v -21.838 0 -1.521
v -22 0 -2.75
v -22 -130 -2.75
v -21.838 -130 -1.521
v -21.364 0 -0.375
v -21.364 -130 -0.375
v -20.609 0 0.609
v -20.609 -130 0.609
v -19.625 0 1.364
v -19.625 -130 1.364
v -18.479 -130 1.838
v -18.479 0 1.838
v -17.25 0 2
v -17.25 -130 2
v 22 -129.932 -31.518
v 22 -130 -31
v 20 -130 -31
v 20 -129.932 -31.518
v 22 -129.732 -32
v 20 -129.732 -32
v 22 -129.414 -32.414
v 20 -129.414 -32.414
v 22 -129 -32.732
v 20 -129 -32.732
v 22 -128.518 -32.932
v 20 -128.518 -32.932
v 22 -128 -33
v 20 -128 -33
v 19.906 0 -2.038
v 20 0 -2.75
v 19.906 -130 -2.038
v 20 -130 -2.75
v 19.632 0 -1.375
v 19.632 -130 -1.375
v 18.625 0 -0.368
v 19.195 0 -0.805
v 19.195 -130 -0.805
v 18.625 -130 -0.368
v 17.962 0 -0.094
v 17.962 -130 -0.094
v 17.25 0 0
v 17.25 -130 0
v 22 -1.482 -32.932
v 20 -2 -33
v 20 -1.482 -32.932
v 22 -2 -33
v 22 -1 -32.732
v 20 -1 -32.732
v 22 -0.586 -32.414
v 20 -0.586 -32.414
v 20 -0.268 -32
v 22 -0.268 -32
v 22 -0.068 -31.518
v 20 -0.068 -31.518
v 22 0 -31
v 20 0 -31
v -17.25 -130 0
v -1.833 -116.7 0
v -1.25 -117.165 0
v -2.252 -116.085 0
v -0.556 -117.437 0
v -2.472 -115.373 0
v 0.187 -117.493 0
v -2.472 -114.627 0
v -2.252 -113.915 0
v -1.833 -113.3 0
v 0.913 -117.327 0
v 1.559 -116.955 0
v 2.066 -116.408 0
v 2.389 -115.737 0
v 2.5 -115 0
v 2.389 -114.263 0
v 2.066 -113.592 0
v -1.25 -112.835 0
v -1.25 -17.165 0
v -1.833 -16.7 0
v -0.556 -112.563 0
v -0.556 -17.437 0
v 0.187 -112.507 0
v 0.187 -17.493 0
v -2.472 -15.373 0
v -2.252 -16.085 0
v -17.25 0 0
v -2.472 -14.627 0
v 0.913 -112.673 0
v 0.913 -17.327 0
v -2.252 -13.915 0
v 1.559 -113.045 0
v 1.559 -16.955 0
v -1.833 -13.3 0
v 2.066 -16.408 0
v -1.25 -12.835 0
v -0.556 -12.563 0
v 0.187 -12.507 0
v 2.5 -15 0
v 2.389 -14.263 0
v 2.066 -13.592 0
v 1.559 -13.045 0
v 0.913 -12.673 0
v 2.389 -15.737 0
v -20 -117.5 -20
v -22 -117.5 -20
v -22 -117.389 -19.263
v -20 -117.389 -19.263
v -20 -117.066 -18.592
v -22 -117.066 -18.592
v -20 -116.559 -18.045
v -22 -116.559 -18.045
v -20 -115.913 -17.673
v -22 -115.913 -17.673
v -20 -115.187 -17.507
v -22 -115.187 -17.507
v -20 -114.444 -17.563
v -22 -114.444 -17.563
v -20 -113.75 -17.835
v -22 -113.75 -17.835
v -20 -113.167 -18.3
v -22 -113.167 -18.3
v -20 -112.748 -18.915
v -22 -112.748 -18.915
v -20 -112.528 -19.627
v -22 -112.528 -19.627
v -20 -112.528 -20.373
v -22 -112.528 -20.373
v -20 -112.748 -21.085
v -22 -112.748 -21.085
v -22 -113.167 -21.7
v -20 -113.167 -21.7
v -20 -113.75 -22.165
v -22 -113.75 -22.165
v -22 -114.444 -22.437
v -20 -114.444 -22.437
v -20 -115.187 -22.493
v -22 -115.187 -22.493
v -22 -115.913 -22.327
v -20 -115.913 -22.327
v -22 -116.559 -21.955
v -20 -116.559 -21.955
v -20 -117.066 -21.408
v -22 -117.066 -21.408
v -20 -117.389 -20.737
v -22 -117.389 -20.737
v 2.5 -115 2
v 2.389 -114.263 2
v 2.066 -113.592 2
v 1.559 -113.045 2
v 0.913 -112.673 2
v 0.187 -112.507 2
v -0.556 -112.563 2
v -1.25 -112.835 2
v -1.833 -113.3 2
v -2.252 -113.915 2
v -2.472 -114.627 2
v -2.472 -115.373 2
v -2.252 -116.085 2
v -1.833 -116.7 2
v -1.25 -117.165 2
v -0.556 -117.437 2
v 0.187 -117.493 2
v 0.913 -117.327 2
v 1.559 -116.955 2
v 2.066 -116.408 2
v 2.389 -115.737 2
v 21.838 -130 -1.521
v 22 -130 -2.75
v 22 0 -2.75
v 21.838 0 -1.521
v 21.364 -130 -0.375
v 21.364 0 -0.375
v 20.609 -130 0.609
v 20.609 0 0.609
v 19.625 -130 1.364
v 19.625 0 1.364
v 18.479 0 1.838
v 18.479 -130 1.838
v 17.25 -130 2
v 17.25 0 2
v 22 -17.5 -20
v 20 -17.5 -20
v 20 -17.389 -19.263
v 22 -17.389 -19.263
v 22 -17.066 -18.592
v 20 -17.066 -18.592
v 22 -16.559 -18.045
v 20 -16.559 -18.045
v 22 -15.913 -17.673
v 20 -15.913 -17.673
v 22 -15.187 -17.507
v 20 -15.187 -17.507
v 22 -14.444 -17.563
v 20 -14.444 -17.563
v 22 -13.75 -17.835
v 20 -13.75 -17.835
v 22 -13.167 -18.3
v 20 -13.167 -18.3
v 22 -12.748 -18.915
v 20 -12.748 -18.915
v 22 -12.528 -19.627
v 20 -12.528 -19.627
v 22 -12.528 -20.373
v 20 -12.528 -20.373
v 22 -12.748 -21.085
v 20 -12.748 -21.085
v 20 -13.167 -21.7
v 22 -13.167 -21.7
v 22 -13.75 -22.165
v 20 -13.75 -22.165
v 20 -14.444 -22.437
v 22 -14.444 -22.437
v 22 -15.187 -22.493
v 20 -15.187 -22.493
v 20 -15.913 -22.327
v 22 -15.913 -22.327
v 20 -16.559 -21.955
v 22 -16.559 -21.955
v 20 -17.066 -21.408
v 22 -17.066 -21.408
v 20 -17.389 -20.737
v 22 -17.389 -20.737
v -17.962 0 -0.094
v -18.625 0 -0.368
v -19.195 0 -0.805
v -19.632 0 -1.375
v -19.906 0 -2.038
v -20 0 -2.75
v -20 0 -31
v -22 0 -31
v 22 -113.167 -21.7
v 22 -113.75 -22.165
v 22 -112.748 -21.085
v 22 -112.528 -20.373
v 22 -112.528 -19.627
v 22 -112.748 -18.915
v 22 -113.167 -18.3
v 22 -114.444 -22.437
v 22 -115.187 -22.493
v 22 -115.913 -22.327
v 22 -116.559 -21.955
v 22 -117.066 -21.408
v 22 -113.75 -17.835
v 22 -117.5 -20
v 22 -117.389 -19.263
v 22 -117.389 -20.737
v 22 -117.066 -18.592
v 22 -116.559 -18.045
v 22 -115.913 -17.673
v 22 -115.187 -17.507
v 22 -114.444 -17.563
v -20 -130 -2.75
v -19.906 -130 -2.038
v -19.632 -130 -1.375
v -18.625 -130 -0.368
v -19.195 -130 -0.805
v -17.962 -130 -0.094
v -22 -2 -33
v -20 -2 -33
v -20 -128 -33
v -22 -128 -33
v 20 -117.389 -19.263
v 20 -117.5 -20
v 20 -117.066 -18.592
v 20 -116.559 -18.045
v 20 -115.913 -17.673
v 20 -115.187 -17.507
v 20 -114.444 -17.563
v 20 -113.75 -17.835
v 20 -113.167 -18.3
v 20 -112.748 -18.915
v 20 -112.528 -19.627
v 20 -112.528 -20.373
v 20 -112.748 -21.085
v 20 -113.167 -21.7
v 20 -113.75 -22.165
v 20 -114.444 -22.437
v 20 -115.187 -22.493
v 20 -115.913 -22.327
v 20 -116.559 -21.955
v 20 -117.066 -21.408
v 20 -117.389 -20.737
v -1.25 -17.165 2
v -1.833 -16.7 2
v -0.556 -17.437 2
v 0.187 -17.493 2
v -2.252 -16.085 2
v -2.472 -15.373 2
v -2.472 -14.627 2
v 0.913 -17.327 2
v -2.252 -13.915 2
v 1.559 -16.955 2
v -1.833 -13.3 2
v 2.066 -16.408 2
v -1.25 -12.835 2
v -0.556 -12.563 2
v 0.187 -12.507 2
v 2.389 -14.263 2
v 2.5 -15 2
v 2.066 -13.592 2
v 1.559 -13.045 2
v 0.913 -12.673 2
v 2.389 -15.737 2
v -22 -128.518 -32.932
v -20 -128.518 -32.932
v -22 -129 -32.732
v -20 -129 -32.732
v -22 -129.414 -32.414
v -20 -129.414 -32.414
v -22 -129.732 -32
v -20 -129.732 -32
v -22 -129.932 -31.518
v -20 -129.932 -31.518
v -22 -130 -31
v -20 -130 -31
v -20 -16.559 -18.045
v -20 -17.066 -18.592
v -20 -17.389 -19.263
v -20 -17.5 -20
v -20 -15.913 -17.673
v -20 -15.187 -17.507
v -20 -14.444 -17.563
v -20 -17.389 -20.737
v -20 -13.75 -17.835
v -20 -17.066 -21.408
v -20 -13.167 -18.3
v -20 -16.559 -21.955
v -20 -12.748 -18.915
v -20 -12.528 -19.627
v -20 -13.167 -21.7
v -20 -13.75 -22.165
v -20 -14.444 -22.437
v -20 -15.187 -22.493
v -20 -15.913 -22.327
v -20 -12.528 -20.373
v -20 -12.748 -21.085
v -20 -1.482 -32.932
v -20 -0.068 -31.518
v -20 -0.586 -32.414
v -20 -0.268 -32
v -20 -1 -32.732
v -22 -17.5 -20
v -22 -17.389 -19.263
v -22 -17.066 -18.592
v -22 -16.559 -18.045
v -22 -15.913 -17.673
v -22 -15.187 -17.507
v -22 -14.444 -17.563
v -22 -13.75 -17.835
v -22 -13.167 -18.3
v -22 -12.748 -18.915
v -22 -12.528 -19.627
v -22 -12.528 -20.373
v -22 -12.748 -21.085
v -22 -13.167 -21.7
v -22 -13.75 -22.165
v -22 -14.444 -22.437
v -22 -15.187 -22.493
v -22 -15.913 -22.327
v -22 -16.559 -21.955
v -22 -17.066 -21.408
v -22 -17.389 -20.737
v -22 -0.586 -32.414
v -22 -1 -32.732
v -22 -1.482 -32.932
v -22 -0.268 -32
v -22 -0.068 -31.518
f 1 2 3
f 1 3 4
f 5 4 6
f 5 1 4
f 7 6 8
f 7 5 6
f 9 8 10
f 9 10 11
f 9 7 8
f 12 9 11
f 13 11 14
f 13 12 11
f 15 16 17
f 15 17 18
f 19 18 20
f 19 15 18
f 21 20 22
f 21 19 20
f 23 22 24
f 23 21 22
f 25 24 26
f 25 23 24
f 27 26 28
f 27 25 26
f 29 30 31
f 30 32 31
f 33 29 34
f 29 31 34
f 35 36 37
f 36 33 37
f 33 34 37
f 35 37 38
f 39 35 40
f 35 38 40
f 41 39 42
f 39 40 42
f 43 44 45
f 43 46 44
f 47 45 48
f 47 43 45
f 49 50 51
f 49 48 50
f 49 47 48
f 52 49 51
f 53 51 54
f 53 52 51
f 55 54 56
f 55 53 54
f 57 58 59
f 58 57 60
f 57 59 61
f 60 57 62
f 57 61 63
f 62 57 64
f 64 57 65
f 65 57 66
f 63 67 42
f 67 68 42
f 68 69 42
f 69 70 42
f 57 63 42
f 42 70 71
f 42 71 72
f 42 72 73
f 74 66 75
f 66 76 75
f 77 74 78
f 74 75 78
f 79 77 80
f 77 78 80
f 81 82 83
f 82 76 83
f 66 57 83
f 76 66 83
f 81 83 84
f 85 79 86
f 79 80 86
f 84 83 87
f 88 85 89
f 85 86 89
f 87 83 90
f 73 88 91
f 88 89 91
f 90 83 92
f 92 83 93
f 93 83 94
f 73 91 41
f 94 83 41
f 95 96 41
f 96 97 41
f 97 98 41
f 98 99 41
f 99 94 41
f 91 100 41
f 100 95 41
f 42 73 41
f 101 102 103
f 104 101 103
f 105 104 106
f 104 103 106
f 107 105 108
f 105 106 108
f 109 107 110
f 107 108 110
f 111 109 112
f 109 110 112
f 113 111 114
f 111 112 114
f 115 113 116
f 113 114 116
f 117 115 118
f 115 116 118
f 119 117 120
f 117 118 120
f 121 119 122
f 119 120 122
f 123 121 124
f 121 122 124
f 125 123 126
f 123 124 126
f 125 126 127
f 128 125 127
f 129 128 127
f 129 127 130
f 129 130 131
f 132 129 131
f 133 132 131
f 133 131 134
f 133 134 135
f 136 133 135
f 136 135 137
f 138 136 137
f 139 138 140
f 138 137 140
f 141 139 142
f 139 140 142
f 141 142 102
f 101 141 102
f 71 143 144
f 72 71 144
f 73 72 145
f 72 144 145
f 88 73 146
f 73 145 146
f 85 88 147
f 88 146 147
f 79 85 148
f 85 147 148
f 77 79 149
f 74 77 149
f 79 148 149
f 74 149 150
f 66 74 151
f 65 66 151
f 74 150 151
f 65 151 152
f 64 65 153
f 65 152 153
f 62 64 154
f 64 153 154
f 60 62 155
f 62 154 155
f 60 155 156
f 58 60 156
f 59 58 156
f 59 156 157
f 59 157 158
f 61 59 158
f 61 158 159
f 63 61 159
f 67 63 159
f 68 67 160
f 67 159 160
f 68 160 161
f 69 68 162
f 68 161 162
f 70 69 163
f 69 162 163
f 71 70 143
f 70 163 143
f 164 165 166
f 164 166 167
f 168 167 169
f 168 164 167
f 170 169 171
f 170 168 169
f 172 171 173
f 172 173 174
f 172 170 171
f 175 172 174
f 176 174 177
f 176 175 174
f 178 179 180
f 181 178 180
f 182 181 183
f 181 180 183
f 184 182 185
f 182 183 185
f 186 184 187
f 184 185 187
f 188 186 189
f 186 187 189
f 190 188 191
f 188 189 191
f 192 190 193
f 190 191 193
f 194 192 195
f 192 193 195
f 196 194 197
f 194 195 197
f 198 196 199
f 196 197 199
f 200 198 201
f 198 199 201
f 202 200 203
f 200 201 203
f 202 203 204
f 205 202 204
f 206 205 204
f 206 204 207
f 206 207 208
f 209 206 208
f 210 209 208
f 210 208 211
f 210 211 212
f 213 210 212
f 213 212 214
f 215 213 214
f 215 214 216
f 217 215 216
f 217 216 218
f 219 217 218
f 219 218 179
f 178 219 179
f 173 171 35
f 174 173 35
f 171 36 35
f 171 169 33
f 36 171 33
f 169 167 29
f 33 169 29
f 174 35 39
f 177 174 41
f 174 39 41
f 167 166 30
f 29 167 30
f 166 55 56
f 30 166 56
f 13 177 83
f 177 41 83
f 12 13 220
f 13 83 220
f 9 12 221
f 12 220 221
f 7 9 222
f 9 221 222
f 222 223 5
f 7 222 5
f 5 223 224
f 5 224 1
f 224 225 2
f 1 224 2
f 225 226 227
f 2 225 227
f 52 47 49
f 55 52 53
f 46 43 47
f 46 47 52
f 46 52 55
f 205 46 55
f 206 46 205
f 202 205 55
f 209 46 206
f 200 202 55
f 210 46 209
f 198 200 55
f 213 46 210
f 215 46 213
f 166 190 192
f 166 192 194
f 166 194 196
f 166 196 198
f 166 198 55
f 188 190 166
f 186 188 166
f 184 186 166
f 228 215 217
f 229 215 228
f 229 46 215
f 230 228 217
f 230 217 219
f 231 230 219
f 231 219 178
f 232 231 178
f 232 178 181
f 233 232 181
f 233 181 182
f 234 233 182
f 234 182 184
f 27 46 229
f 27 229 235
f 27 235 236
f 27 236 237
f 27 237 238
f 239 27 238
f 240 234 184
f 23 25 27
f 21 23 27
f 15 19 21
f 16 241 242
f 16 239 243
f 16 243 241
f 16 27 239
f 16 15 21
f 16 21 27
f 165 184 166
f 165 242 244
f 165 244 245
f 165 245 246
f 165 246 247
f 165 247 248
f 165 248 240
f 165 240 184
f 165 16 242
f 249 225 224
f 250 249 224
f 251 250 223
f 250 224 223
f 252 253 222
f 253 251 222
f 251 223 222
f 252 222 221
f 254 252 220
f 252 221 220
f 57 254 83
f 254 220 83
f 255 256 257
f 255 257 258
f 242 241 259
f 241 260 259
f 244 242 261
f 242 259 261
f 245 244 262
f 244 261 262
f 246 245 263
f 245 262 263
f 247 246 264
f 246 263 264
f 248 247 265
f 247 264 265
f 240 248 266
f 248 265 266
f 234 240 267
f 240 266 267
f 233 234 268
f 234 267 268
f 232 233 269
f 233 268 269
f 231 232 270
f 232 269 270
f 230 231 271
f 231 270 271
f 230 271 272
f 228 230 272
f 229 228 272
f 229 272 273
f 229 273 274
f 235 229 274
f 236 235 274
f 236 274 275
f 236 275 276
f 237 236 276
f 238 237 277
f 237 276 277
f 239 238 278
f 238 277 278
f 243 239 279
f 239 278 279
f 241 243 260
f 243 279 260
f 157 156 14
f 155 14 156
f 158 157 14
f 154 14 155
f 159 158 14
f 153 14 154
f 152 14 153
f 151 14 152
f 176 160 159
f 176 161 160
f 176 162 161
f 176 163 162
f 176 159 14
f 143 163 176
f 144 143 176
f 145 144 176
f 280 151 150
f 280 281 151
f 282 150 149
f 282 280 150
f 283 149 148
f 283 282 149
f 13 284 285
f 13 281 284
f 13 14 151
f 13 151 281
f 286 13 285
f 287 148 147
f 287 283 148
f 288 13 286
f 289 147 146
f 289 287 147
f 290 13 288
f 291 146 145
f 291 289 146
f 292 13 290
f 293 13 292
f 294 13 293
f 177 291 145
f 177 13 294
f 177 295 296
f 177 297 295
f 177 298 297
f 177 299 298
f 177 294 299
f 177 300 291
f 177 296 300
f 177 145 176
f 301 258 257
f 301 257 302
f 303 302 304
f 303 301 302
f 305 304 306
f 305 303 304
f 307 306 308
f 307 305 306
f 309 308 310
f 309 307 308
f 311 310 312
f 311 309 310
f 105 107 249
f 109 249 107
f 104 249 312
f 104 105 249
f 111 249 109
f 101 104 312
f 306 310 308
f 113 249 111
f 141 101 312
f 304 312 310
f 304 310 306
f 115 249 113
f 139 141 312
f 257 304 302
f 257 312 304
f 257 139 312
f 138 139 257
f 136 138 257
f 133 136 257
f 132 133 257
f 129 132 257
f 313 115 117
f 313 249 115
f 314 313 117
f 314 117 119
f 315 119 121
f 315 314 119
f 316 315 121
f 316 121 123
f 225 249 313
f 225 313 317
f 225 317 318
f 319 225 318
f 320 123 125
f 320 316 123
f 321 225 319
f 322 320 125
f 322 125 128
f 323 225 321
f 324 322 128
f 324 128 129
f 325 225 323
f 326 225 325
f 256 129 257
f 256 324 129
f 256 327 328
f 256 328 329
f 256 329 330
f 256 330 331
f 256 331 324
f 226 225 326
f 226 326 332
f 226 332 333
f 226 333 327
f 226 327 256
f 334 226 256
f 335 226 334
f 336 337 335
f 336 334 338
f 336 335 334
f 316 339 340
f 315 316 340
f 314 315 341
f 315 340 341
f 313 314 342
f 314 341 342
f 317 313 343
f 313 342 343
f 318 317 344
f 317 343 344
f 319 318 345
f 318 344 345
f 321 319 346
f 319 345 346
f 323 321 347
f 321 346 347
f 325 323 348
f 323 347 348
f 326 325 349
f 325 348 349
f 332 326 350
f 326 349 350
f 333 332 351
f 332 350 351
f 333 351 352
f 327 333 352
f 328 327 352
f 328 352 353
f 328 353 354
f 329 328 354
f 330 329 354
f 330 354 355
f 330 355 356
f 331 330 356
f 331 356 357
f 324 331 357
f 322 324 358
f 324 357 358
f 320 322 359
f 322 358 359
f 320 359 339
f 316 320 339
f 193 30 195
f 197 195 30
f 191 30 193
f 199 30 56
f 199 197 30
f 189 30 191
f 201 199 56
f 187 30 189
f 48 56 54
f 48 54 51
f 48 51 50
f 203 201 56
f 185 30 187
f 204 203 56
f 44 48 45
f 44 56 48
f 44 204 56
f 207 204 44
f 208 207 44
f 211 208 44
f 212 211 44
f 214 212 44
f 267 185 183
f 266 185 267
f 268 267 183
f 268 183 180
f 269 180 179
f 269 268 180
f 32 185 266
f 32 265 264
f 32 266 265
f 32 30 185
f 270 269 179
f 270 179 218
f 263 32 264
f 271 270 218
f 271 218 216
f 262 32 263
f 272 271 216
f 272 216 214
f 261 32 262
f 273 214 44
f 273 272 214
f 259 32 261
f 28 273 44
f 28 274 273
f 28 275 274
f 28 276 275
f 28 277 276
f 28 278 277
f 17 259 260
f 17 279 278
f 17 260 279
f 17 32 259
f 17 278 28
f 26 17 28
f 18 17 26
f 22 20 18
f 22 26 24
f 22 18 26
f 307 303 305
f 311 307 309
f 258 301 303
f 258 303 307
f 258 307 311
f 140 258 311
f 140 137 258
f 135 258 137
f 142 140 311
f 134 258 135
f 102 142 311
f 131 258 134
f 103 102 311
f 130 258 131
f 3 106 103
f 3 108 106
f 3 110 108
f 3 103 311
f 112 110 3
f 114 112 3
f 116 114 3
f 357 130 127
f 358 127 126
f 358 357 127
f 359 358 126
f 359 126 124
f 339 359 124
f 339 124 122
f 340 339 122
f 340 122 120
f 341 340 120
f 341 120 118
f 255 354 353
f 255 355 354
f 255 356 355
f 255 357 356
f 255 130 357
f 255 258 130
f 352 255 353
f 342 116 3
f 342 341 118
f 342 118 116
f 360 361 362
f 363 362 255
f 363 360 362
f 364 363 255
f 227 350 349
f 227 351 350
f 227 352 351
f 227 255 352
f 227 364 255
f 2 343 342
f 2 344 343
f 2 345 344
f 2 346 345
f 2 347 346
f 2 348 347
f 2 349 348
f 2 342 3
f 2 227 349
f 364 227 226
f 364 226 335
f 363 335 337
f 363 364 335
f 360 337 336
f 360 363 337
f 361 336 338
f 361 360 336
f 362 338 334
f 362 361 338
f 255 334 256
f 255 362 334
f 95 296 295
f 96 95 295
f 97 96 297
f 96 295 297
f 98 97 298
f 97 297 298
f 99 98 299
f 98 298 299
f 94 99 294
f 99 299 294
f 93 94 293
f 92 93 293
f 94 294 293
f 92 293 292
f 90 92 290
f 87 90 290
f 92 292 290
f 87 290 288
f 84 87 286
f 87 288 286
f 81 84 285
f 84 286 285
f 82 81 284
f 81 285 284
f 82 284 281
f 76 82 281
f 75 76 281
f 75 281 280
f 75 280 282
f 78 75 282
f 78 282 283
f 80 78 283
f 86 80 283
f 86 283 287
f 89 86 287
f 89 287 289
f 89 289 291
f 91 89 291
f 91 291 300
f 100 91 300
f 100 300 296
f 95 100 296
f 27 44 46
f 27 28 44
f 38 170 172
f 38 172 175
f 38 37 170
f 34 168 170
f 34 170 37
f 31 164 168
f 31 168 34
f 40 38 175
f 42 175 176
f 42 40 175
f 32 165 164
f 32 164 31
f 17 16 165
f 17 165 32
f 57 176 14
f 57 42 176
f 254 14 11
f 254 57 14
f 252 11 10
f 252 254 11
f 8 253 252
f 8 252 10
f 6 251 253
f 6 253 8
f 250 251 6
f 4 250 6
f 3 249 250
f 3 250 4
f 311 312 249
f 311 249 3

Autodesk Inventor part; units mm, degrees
ref_plane "YZ Plane" through (0, 0, 0) normal (1, 0, 0) x (0, 1, 0)
ref_plane "XZ Plane" through (0, 0, 0) normal (0, 1, 0) x (-1, 0, 0)
ref_plane "XY Plane" through (0, 0, 0) normal (0, 0, 1) x (1, 0, 0)
sketch "Sketch1" plane through (0, 0, 0) normal (0, 0, 1) x (1, 0, 0)
  line L0 (-20, 0) -> (20, 0)
  line L1 (20, 0) -> (20, -130)
  line L2 (20, -130) -> (-20, -130)
  line L3 (-20, -130) -> (-20, 0)
  point P0 (0, 0)
  point P1 (0, 0)
  dimension "d0" = 40
  dimension "d1" = 130
extrude "Plate1" add sketch "Sketch1" along normal blind 2
sketch "Sketch2" plane through (20, -130, 0) normal (1, 0, 0) x (0, 1, 0)
  line L0 (130, 0) -> (0, 0)
  line L1 (0, 0) -> (0, -33)
  line L2 (0, -33) -> (130, -33)
  line L3 (130, -33) -> (130, 0)
edge flange "Flange1" height 35 angle 90 thickness 2 bend radius 2.75 thickness toward (1, 0, 0) relief round relief width 2 relief depth 1 corner gap 2.75 corner form 0 edges at (20, -65, 0) (-20, -65, 0) wall of the first edge with corners at (20, 0, 0) (20, -130, 0) (20, -130, -33) (20, 0, -33)
bend "Bend1"
corner "Corner1"
sketch "Sketch3" plane through (0, 0, 0) normal (1, 0, 0) x (0, 1, 0)
  line L0 (0, -33) -> (-130, -33) projected
  line L1 (-115, -20) -> (-115, -20) construction
  line L2 (-117.5, -20) -> (-117.5, -20)
  line L3 (-112.5, -20) -> (-112.5, -20)
  arc A0 (-112.5, -20) -> (-117.5, -20) centre (-115, -20) ccw
  arc A1 (-117.5, -20) -> (-112.5, -20) centre (-115, -20) ccw
  line L4 (-130, -2.75) -> (-130, -33) projected
  point P0 (0, 0)
  point P1 (-115, -20)
  dimension "d14" = 0
  dimension "d15" = 13
  dimension "d17" = 2.5
  dimension "d18" = 15
extrude "Extrusion1" cut sketch "Sketch3" along normal through all both and the other way through all
sketch "Sketch6" plane through (0, 0, 2) normal (0, 0, 1) x (1, 0, 0)
  line L0 (-17.25, 0) -> (17.25, 0) projected
  circle A0 centre (0, -115) radius 2.5
  line L1 (22, -112.5) -> (22, -117.5) projected
  point P0 (0, 0)
  point P1 (0, 0)
  point P2 (22, -115)
  dimension "d27" = 5
extrude "Extrusion3" cut sketch "Sketch6" against normal blind 10
fillet "Fillet1" radius 2 4 edges at (21, 0, -33) (-21, 0, -33) (21, -130, -33) (-21, -130, -33)
pattern_linear "Rectangular Pattern2" count 2 spacing 100 along (0, 1, 0) of "Extrusion1", "Extrusion3"
equation "\"d2\" = Thickness"
equation "\"d3\" = BendReliefWidth"
equation "\"d4\" = BendReliefDepth"
equation "\"d5\" = MinimumRemnant"
equation "\"d6\" = TransitionRadius"
equation "\"d9\" = BendRadius"
equation "\"d10\" = CornerReliefSize"
equation "\"d11\" = GapSize"
equation "\"d12\" = JacobiRadiusSize"
equation "\"BendReliefWidth\" = Thickness"
equation "\"BendReliefDepth\" = 0.5 * Thickness"
equation "\"CornerReliefSize\" = 4 * Thickness"
equation "\"MinimumRemnant\" = 2 * Thickness"
equation "\"TransitionRadius\" = BendRadius"
equation "\"JacobiRadiusSize\" = BendRadius"
equation "\"GapSize\" = Thickness"
equation "\"Thickness\" = 2"
equation "\"BendRadius\" = 2.75"
properties part number "NDM 11.027 bracket 27" material "Stainless Steel"
